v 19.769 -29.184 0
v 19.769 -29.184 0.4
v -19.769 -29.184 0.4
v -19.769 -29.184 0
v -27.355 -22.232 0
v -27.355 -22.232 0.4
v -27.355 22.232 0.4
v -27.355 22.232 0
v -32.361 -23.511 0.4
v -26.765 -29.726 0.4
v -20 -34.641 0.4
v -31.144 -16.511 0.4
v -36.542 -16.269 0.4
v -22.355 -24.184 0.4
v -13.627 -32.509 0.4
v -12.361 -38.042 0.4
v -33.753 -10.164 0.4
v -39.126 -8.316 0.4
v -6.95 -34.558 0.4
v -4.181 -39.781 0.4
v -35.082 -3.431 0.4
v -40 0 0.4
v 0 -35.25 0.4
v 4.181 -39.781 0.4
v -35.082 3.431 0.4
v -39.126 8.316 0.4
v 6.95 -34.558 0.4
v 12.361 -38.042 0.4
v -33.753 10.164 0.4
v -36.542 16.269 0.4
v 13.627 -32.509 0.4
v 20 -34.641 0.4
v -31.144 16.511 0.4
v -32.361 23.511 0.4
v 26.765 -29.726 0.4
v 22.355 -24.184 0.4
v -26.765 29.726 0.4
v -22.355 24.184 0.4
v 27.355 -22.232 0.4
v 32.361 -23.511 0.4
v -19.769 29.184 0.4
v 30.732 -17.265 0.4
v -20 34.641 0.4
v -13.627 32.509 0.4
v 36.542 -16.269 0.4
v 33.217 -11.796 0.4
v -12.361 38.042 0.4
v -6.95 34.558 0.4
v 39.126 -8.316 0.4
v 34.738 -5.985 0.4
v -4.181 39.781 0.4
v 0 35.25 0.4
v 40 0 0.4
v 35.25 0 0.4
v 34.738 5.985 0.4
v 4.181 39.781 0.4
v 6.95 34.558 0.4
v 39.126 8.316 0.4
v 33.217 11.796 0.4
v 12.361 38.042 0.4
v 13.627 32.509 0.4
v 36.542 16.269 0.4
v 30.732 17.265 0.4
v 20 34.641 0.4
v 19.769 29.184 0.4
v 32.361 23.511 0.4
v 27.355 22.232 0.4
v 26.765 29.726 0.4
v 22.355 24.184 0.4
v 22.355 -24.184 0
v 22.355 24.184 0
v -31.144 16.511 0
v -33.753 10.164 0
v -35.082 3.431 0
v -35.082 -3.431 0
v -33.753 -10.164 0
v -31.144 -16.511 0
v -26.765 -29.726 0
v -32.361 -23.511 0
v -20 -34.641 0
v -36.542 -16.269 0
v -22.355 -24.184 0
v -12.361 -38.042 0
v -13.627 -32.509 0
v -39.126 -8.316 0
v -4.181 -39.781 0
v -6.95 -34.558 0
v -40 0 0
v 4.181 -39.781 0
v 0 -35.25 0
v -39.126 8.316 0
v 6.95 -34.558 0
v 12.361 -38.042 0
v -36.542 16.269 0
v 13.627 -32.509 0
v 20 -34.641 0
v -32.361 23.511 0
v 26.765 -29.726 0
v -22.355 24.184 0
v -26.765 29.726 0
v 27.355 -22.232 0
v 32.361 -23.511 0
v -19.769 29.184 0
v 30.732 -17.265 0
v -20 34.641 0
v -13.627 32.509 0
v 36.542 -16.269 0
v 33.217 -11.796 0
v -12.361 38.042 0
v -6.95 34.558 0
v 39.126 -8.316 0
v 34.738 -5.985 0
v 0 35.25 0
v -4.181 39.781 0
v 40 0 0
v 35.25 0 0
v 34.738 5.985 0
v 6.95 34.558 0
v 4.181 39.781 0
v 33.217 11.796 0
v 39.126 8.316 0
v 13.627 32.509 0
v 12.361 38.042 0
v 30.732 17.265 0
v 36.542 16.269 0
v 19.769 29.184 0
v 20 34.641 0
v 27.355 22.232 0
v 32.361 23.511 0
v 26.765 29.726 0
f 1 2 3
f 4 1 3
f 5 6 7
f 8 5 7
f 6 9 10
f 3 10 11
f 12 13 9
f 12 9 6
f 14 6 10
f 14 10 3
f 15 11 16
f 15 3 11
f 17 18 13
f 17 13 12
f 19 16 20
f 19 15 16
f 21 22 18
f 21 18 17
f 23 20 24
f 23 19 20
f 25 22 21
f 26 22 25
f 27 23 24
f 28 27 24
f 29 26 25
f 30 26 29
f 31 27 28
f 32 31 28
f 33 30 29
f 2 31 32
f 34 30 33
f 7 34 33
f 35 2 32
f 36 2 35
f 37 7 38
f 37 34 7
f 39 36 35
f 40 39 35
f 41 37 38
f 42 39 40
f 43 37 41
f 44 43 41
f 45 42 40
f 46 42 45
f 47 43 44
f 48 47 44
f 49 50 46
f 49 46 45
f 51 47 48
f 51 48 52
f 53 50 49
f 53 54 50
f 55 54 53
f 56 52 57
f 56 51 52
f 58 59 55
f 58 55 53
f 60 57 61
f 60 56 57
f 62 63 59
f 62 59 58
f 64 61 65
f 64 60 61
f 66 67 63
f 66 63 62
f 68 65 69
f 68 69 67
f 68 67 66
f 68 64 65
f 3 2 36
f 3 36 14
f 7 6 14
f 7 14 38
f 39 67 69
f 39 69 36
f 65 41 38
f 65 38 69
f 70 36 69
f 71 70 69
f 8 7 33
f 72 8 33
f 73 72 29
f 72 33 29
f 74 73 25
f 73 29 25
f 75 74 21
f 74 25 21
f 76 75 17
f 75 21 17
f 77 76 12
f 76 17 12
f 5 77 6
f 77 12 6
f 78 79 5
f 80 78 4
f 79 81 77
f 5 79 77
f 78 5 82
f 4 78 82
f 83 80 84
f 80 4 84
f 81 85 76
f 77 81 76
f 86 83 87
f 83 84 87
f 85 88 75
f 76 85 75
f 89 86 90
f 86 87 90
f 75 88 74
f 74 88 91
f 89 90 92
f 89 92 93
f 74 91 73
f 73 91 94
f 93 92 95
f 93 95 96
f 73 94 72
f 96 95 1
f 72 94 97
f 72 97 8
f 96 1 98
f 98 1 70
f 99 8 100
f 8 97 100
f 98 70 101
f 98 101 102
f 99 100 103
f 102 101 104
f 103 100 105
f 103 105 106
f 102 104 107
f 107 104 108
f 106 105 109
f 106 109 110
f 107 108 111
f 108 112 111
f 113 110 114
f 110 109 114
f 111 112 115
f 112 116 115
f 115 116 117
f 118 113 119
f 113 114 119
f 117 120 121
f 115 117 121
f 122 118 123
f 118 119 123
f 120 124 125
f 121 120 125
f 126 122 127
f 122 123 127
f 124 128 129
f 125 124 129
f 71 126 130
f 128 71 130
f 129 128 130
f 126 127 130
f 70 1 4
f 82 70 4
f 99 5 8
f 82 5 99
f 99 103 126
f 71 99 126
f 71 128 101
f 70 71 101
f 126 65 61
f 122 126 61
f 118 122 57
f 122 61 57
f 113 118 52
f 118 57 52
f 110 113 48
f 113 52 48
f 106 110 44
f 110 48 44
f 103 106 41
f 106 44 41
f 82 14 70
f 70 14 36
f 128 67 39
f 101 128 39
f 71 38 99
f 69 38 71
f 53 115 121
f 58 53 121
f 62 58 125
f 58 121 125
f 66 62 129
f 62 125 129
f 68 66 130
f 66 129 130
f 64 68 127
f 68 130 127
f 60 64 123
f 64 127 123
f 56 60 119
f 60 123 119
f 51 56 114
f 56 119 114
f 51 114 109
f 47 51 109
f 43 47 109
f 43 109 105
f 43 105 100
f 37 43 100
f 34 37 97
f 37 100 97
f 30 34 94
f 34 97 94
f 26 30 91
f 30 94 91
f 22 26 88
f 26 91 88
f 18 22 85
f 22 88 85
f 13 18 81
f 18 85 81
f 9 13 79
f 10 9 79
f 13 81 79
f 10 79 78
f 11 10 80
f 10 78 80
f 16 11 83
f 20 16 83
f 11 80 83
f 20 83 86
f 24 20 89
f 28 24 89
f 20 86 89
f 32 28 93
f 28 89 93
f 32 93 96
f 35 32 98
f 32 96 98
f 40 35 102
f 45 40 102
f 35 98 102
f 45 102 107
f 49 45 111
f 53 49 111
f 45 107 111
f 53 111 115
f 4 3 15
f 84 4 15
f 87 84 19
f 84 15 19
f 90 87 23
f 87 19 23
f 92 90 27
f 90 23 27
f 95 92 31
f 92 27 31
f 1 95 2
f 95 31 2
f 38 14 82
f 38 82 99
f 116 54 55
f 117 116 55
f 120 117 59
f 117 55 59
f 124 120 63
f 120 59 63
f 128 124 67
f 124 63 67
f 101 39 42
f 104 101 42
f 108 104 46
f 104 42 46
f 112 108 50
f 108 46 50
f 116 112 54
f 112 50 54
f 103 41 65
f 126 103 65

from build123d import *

# Parameters (mm, degrees)
F0_R     = 40
F1_DEPTH = 0.4
F2_W     = 44.7093093119
F2_H     = 48.3685829416
F3_DEPTH = 25


with BuildPart() as f1:
    # F0 (on Top) → F1 (new body)
    with BuildSketch(Plane.XY):
        Circle(F0_R)
    extrude(amount=F1_DEPTH)

    # F2 (on face) → F3 (cut)
    with BuildSketch(Plane.XY.offset(0.4)):
        Rectangle(F2_W, F2_H)
        with BuildLine():
            Line((-27.354654656, -22.2321893938), (-27.354654656, 22.2321893938))
            ThreePointArc((-27.354654656, 22.2321893938), (-35.2497854829, 0), (-27.354654656, -22.2321893938))
        make_face()
        with BuildLine():
            ThreePointArc((19.7692819277, 29.1842914708), (0, 35.2497854829), (-19.7692819277, 29.1842914708))
            Line((-19.7692819277, 29.1842914708), (19.7692819277, 29.1842914708))
        make_face()
        with BuildLine():
            ThreePointArc((35.2497854829, 0), (33.2174132434, 11.7962211748), (27.354654656, 22.2321893938))
            Line((27.354654656, 22.2321893938), (27.354654656, -22.2321893938))
            ThreePointArc((27.354654656, -22.2321893938), (33.2174132434, -11.7962211748), (35.2497854829, 0))
        make_face()
        with BuildLine():
            Line((19.7692819277, -29.1842914708), (-19.7692819277, -29.1842914708))
            ThreePointArc((-19.7692819277, -29.1842914708), (0, -35.2497854829), (19.7692819277, -29.1842914708))
        make_face()
    extrude(amount=-F3_DEPTH, mode=Mode.SUBTRACT)


solid = f1.part
